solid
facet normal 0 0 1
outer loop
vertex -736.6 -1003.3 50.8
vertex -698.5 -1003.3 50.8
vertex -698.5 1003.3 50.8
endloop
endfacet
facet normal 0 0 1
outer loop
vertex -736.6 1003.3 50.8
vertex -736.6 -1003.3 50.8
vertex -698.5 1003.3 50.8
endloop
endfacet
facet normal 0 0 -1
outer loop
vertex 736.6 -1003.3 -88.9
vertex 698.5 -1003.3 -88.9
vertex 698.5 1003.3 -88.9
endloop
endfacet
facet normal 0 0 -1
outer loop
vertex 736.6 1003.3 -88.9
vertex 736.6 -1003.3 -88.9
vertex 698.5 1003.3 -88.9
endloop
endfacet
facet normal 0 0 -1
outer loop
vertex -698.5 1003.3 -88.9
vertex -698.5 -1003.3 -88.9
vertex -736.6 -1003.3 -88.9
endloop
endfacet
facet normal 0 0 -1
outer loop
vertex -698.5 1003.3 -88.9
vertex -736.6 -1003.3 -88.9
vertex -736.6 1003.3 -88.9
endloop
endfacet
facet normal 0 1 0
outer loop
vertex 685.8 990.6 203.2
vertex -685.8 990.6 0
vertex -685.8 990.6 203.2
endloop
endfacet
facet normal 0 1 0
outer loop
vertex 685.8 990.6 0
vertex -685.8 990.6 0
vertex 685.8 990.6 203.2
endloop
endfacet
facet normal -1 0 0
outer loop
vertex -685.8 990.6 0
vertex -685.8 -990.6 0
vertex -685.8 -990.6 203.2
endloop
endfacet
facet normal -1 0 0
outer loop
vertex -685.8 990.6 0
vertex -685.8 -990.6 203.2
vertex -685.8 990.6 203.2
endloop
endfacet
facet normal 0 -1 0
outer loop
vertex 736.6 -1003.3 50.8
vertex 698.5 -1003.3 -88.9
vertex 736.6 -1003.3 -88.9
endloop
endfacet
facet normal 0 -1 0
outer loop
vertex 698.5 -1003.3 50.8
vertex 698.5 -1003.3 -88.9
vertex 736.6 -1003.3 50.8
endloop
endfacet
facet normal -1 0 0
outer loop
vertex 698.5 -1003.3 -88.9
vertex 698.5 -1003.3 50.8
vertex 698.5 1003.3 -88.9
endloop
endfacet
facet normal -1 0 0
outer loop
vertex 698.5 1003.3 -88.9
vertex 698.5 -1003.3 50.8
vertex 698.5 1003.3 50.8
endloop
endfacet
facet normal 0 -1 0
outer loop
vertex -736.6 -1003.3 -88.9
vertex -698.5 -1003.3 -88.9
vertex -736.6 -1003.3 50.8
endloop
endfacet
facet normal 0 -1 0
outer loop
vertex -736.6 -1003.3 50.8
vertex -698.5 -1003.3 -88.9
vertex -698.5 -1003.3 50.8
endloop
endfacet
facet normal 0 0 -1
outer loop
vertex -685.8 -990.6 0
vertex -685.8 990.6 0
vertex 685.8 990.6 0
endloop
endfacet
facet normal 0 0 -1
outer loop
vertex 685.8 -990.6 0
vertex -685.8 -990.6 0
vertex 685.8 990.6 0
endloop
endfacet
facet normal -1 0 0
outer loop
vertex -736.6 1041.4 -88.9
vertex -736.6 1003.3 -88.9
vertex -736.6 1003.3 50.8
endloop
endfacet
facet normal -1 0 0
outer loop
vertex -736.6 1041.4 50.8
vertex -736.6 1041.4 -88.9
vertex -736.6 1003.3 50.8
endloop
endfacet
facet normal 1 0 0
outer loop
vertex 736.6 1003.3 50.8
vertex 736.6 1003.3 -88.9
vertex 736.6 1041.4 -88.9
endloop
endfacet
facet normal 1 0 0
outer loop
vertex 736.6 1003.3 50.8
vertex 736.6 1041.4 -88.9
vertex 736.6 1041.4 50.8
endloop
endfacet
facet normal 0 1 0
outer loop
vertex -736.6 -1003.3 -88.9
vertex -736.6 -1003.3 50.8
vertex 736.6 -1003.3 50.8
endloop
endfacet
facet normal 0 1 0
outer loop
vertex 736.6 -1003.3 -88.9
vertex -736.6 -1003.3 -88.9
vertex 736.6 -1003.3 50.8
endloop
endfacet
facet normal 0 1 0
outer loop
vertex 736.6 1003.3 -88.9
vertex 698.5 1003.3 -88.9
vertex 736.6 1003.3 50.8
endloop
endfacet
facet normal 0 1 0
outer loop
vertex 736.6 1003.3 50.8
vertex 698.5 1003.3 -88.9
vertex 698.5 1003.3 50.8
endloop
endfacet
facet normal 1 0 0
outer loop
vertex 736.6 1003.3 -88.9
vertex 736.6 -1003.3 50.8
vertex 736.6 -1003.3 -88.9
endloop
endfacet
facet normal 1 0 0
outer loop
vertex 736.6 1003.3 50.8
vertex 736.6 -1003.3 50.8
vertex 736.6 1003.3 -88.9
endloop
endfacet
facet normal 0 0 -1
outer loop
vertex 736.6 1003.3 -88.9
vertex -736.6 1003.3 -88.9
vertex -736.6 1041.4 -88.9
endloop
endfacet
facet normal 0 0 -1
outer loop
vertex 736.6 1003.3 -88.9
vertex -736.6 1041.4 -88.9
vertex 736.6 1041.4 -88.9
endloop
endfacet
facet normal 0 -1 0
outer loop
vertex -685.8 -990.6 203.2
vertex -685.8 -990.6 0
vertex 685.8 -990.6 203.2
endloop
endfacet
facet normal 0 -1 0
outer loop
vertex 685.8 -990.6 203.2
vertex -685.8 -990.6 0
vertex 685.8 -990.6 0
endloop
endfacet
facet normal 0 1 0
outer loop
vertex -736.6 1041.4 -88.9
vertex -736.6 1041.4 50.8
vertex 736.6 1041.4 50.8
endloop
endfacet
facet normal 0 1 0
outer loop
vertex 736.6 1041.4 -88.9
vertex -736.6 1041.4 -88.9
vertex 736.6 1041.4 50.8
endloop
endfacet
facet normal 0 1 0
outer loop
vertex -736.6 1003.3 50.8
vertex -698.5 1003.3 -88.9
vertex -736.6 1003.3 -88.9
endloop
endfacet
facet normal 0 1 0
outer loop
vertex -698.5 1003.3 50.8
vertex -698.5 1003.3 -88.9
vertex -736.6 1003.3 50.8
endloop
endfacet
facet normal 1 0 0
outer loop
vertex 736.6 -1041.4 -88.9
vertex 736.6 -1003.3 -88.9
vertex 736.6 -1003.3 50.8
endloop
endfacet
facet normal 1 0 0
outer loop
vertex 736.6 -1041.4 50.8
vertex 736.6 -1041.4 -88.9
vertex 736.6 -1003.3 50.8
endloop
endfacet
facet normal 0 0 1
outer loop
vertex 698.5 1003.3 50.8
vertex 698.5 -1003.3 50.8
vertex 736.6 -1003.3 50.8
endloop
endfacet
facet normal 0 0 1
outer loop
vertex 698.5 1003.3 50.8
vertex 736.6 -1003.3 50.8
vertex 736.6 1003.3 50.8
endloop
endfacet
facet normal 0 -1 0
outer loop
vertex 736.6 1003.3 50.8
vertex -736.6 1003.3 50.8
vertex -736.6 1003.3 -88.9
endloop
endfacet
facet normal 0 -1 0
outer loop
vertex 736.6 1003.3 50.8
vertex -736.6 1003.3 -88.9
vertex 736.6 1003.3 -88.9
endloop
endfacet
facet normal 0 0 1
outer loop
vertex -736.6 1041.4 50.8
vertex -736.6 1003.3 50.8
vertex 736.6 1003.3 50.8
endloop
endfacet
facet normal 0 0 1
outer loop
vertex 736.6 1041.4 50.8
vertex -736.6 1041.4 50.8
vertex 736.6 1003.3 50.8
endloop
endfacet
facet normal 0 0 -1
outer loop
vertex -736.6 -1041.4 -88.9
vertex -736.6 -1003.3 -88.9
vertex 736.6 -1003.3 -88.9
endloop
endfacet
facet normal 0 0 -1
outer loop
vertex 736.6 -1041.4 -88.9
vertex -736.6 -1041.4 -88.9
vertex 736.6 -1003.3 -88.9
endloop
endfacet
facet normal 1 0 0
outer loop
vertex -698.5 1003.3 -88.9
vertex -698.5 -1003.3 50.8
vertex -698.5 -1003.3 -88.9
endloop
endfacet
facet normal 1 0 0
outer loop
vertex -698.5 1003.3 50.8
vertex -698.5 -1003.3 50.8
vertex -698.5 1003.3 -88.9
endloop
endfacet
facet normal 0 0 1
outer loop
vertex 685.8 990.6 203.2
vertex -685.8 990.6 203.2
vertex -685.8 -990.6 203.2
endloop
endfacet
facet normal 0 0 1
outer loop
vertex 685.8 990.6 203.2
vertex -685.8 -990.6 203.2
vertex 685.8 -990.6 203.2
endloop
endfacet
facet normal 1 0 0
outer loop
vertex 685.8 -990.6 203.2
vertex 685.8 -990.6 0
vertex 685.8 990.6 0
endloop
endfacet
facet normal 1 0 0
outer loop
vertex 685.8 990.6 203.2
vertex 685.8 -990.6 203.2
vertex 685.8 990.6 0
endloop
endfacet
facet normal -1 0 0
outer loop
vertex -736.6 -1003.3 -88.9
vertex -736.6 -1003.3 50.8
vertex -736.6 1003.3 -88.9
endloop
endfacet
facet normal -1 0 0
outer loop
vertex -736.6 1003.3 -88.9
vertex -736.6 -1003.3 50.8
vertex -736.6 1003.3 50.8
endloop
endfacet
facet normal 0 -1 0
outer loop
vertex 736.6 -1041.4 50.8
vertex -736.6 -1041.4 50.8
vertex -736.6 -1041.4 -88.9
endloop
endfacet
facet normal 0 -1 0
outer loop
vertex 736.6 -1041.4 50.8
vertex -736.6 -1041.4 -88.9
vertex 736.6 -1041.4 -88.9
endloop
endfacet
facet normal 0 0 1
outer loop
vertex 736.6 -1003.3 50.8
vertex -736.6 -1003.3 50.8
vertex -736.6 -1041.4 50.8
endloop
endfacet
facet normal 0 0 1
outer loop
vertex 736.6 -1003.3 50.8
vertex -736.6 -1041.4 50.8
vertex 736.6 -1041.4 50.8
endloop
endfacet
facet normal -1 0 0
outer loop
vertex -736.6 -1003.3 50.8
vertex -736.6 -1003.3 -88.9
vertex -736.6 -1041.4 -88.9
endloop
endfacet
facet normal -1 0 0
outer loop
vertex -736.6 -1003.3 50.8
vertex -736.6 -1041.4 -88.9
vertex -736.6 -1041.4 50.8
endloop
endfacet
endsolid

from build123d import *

# Parameters (mm, degrees)
F0_W     = 1371.6
F0_H     = 1981.2
F1_DEPTH = 203.2
F3_W     = 2006.6
F3_H     = 139.7
F4_DEPTH = 38.1
F7_W     = 1473.2
F7_H     = 139.7
F8_DEPTH = 38.1


with BuildPart() as f1:
    # F0 (on Top) → F1 (new body)
    with BuildSketch(Plane.XY):
        Rectangle(F0_W, F0_H)
    extrude(amount=F1_DEPTH)


with BuildPart() as f4:
    # F3 (on offset) → F4 (new body)
    with BuildSketch(Plane.YZ.offset(698.5)):
        with Locations((0, -19.05)):
            Rectangle(F3_W, F3_H)
    extrude(amount=F4_DEPTH)


with BuildPart() as f5_1:
    # F5: instance of F4
    add(f4.part.mirror(Plane.YZ))


with BuildPart() as f8:
    # F7 (on offset) → F8 (new body)
    with BuildSketch(Plane.XZ.offset(1003.3)):
        with Locations((0, -19.05)):
            Rectangle(F7_W, F7_H)
    extrude(amount=F8_DEPTH)


with BuildPart() as f9_1:
    # F9: instance of F8
    add(f8.part.mirror(Plane.XZ))


solid = Compound([f1.part, f4.part, f5_1.part, f8.part, f9_1.part])
